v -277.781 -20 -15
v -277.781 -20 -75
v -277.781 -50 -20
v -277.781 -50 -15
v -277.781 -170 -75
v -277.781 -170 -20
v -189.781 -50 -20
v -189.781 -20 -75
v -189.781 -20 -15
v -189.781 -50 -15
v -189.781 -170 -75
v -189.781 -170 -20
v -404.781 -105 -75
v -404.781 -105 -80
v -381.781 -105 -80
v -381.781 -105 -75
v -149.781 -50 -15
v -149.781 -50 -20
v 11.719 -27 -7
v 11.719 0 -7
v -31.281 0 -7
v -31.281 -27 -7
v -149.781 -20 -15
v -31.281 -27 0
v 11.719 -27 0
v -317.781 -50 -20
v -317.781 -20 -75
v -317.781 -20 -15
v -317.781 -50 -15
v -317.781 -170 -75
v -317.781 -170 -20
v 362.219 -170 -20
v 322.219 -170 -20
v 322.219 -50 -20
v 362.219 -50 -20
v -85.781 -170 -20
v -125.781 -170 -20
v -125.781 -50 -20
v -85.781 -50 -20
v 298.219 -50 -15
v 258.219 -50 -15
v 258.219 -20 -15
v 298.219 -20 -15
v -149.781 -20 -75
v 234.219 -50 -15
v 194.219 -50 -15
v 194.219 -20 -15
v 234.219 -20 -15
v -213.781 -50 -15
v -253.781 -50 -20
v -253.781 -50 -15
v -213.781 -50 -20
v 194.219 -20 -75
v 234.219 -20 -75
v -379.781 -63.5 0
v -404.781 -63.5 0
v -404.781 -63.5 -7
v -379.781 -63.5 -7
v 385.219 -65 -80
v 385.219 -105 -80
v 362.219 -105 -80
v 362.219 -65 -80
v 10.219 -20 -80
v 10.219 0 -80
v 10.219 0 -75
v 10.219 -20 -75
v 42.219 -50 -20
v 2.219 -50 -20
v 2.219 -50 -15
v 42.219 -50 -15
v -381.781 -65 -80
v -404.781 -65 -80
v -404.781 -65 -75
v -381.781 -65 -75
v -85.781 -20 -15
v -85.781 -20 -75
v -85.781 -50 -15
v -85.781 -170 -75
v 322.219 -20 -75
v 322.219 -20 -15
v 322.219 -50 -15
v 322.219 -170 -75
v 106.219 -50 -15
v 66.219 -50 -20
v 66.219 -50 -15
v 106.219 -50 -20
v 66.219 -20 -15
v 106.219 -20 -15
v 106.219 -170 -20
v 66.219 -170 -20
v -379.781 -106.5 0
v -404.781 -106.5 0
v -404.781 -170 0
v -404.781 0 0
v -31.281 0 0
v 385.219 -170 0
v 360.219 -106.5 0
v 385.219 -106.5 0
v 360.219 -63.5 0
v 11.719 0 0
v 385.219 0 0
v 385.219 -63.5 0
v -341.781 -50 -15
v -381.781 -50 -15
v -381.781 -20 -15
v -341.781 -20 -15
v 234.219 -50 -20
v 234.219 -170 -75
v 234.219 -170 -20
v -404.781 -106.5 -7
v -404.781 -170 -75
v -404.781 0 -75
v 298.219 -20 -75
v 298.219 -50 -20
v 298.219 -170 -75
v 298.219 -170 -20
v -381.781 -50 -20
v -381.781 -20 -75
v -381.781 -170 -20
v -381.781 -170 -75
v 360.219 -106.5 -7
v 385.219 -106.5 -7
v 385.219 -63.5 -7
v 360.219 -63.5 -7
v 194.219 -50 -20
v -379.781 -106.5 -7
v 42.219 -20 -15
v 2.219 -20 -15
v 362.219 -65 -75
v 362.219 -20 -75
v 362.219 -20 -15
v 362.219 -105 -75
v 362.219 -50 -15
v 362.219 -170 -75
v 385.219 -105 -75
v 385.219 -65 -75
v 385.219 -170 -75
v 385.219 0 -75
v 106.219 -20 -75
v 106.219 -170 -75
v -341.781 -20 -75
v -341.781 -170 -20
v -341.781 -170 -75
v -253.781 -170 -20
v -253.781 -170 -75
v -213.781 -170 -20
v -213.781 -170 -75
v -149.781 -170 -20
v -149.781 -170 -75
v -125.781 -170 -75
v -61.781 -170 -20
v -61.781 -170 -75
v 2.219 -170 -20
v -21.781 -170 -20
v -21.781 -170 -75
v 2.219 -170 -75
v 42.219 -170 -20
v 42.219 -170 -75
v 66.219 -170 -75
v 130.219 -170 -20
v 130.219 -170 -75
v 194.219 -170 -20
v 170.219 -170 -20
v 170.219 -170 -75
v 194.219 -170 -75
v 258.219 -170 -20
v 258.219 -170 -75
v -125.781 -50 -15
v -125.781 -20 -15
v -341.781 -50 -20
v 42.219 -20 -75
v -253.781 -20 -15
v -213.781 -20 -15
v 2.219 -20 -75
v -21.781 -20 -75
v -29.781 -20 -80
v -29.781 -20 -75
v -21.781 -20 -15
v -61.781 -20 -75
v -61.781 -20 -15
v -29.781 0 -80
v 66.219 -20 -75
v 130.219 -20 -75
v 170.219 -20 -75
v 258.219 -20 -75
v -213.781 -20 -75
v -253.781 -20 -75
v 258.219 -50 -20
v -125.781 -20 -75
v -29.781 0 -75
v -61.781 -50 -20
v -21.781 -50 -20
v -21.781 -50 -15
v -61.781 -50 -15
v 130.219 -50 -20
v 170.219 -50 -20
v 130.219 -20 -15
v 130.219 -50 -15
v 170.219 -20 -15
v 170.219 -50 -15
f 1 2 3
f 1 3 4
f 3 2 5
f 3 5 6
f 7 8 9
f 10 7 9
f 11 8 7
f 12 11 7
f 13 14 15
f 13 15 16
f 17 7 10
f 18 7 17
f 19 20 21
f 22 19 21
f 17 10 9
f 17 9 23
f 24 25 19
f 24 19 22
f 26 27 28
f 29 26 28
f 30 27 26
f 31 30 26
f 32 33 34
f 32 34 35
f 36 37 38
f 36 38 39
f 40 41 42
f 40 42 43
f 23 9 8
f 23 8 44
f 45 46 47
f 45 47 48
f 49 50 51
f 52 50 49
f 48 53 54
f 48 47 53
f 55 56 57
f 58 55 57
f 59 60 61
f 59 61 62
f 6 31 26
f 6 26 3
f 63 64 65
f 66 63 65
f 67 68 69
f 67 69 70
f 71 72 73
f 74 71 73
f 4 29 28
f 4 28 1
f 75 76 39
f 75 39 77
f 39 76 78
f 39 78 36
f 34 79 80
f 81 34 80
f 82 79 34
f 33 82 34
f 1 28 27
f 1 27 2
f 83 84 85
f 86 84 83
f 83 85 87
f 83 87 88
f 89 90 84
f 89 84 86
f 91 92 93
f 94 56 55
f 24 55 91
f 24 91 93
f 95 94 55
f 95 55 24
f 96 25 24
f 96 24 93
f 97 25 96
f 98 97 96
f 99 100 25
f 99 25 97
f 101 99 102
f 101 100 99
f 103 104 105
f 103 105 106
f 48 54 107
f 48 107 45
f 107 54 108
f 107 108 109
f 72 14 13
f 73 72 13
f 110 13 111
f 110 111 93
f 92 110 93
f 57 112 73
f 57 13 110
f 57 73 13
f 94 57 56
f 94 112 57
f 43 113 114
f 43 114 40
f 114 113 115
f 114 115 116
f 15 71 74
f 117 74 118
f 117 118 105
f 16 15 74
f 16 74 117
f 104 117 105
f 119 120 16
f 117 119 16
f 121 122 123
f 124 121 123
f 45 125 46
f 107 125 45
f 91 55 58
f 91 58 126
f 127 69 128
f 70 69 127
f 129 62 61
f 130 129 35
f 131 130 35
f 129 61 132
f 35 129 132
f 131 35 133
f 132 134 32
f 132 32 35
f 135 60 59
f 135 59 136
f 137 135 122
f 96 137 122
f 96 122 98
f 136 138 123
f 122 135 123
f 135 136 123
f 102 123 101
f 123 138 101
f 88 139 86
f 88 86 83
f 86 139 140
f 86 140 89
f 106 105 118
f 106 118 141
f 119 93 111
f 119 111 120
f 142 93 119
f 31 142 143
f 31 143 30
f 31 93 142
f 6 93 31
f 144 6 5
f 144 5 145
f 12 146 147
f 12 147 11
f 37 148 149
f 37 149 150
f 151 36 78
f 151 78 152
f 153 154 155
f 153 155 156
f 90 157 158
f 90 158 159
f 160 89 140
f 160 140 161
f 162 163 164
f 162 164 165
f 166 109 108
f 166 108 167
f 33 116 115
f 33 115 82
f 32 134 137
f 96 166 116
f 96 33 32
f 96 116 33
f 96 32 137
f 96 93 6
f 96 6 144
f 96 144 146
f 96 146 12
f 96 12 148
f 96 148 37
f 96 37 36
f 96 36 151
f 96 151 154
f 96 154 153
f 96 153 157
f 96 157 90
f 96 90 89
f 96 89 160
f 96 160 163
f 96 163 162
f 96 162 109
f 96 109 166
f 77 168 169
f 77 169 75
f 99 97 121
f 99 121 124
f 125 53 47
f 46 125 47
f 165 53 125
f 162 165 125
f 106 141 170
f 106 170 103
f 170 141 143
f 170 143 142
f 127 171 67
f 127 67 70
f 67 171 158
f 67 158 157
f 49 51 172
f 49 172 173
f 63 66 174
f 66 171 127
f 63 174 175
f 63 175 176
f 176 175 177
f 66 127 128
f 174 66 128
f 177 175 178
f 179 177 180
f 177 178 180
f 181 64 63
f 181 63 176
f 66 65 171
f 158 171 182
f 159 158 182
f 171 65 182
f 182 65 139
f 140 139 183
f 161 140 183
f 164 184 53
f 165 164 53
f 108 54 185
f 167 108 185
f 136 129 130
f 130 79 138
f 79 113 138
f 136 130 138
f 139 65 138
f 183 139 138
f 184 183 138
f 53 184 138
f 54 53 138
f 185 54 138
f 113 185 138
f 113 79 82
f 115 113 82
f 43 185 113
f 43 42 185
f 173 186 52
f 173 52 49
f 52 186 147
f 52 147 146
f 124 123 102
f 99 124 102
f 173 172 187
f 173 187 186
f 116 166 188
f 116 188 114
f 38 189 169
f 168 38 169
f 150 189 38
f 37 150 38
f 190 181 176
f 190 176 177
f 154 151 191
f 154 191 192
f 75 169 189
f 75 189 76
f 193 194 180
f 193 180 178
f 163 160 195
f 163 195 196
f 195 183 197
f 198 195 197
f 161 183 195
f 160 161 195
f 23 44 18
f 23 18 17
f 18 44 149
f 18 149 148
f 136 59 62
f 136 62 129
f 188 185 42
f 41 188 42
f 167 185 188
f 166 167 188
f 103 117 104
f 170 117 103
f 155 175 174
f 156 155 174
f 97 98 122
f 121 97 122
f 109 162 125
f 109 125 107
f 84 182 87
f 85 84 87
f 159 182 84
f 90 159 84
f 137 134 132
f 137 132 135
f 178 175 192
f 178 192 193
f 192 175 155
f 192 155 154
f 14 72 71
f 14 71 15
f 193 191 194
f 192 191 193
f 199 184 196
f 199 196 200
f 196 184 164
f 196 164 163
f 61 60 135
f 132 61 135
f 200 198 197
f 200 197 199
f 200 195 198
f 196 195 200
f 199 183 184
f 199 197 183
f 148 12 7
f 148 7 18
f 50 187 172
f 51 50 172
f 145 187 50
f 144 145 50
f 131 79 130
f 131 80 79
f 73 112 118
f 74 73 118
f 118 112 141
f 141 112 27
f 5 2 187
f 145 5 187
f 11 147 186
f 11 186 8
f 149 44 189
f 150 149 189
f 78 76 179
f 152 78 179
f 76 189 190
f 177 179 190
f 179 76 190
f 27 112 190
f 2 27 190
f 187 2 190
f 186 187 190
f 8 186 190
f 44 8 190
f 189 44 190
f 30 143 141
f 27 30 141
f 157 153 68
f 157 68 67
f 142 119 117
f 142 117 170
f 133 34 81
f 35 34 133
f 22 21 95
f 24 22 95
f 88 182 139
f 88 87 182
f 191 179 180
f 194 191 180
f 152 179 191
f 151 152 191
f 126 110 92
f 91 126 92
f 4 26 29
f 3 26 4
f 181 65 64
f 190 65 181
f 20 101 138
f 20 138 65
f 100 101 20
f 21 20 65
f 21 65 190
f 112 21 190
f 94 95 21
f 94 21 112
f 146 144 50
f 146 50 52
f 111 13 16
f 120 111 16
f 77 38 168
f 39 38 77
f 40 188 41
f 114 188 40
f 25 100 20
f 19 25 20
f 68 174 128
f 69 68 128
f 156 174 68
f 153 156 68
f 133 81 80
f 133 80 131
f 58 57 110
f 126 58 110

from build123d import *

# Parameters (mm, degrees)
F0_W      = 790
F0_H      = 75
F1_DEPTH  = 170
F2_W      = 40
F2_H      = 55
F3_DEPTH  = 150
F5_DEPTH  = 25
F4_W      = 40
F4_H      = 5
F6_DEPTH  = 23
F7_W      = 40
F7_H      = 5
F8_DEPTH  = 23
F10_DEPTH = 25
F12_DEPTH = 27
F13_W     = 40
F13_H     = 5
F14_DEPTH = 20
F15_W     = 40
F15_H     = 30
F16_DEPTH = 5


with BuildPart() as f1:
    # F0 (on Front) → F1 (new body)
    with BuildSketch(Plane.XZ):
        with Locations((-9.780855, -37.5)):
            Rectangle(F0_W, F0_H)
    extrude(amount=F1_DEPTH)

    # F2 (on face) → F3 (cut)
    with BuildSketch(Plane.XZ.offset(170)):
        with Locations((-361.780855, -47.5)):
            Rectangle(F2_W, F2_H)
        with Locations((-297.780855, -47.5)):
            Rectangle(F2_W, F2_H)
        with Locations((-233.780855, -47.5)):
            Rectangle(F2_W, F2_H)
        with Locations((-169.780855, -47.5)):
            Rectangle(F2_W, F2_H)
        with Locations((-105.780855, -47.5)):
            Rectangle(F2_W, F2_H)
        with Locations((-41.780855, -47.5)):
            Rectangle(F2_W, F2_H)
        with Locations((22.219145, -47.5)):
            Rectangle(F2_W, F2_H)
        with Locations((86.219145, -47.5)):
            Rectangle(F2_W, F2_H)
        with Locations((150.219145, -47.5)):
            Rectangle(F2_W, F2_H)
        with Locations((214.219145, -47.5)):
            Rectangle(F2_W, F2_H)
        with Locations((278.219145, -47.5)):
            Rectangle(F2_W, F2_H)
        with Locations((342.219145, -47.5)):
            Rectangle(F2_W, F2_H)
    extrude(amount=-F3_DEPTH, mode=Mode.SUBTRACT)

    # F4 (on face) → F5 (cut)
    with BuildSketch(Plane(origin=(-404.780855, 0, 0), x_dir=(0, -1, 0), z_dir=(-1, 0, 0))):
        Polygon((106.5, 0), (85, 0), (63.5, 0), (63.5, -7), (106.5, -7), align=None)
    extrude(amount=-F5_DEPTH, mode=Mode.SUBTRACT)

    # F4 (on face) → F6 (join)
    with BuildSketch(Plane(origin=(-404.780855, 0, 0), x_dir=(0, -1, 0), z_dir=(-1, 0, 0))):
        with Locations((85, -77.5)):
            Rectangle(F4_W, F4_H)
    extrude(amount=-F6_DEPTH)

    # F7 (on face) → F8 (join)
    with BuildSketch(Plane.YZ.offset(385.219145)):
        with Locations((-85, -77.5)):
            Rectangle(F7_W, F7_H)
    extrude(amount=-F8_DEPTH)

    # F9 (on face) → F10 (cut)
    with BuildSketch(Plane.YZ.offset(385.219145)):
        Polygon((-63.5, 0), (-85, 0), (-106.5, 0), (-106.5, -7), (-63.5, -7), align=None)
    extrude(amount=-F10_DEPTH, mode=Mode.SUBTRACT)

    # F11 (on face) → F12 (cut)
    with BuildSketch(Plane(origin=(0, 0, 0), x_dir=(-1, 0, 0), z_dir=(0, 1, 0))):
        Polygon((31.280855, 0), (9.780855, 0), (-11.719145, 0), (-11.719145, -7), (31.280855, -7), align=None)
    extrude(amount=-F12_DEPTH, mode=Mode.SUBTRACT)

    # F13 (on face) → F14 (join)
    with BuildSketch(Plane(origin=(0, 0, 0), x_dir=(-1, 0, 0), z_dir=(0, 1, 0))):
        with Locations((9.780855, -77.5)):
            Rectangle(F13_W, F13_H)
    extrude(amount=-F14_DEPTH)

    # F15 (on face) → F16 (cut)
    with BuildSketch(Plane(origin=(0, 0, -20), x_dir=(1, 0, 0), z_dir=(0, 0, -1))):
        with Locations((-361.780855, 35)):
            Rectangle(F15_W, F15_H)
        with Locations((-297.780855, 35)):
            Rectangle(F15_W, F15_H)
        with Locations((-233.780855, 35)):
            Rectangle(F15_W, F15_H)
        with Locations((-169.780855, 35)):
            Rectangle(F15_W, F15_H)
        with Locations((-105.780855, 35)):
            Rectangle(F15_W, F15_H)
        with Locations((-41.780855, 35)):
            Rectangle(F15_W, F15_H)
        with Locations((22.219145, 35)):
            Rectangle(F15_W, F15_H)
        with Locations((86.219145, 35)):
            Rectangle(F15_W, F15_H)
        with Locations((150.219145, 35)):
            Rectangle(F15_W, F15_H)
        with Locations((214.219145, 35)):
            Rectangle(F15_W, F15_H)
        with Locations((278.219145, 35)):
            Rectangle(F15_W, F15_H)
        with Locations((342.219145, 35)):
            Rectangle(F15_W, F15_H)
    extrude(amount=-F16_DEPTH, mode=Mode.SUBTRACT)


solid = f1.part
